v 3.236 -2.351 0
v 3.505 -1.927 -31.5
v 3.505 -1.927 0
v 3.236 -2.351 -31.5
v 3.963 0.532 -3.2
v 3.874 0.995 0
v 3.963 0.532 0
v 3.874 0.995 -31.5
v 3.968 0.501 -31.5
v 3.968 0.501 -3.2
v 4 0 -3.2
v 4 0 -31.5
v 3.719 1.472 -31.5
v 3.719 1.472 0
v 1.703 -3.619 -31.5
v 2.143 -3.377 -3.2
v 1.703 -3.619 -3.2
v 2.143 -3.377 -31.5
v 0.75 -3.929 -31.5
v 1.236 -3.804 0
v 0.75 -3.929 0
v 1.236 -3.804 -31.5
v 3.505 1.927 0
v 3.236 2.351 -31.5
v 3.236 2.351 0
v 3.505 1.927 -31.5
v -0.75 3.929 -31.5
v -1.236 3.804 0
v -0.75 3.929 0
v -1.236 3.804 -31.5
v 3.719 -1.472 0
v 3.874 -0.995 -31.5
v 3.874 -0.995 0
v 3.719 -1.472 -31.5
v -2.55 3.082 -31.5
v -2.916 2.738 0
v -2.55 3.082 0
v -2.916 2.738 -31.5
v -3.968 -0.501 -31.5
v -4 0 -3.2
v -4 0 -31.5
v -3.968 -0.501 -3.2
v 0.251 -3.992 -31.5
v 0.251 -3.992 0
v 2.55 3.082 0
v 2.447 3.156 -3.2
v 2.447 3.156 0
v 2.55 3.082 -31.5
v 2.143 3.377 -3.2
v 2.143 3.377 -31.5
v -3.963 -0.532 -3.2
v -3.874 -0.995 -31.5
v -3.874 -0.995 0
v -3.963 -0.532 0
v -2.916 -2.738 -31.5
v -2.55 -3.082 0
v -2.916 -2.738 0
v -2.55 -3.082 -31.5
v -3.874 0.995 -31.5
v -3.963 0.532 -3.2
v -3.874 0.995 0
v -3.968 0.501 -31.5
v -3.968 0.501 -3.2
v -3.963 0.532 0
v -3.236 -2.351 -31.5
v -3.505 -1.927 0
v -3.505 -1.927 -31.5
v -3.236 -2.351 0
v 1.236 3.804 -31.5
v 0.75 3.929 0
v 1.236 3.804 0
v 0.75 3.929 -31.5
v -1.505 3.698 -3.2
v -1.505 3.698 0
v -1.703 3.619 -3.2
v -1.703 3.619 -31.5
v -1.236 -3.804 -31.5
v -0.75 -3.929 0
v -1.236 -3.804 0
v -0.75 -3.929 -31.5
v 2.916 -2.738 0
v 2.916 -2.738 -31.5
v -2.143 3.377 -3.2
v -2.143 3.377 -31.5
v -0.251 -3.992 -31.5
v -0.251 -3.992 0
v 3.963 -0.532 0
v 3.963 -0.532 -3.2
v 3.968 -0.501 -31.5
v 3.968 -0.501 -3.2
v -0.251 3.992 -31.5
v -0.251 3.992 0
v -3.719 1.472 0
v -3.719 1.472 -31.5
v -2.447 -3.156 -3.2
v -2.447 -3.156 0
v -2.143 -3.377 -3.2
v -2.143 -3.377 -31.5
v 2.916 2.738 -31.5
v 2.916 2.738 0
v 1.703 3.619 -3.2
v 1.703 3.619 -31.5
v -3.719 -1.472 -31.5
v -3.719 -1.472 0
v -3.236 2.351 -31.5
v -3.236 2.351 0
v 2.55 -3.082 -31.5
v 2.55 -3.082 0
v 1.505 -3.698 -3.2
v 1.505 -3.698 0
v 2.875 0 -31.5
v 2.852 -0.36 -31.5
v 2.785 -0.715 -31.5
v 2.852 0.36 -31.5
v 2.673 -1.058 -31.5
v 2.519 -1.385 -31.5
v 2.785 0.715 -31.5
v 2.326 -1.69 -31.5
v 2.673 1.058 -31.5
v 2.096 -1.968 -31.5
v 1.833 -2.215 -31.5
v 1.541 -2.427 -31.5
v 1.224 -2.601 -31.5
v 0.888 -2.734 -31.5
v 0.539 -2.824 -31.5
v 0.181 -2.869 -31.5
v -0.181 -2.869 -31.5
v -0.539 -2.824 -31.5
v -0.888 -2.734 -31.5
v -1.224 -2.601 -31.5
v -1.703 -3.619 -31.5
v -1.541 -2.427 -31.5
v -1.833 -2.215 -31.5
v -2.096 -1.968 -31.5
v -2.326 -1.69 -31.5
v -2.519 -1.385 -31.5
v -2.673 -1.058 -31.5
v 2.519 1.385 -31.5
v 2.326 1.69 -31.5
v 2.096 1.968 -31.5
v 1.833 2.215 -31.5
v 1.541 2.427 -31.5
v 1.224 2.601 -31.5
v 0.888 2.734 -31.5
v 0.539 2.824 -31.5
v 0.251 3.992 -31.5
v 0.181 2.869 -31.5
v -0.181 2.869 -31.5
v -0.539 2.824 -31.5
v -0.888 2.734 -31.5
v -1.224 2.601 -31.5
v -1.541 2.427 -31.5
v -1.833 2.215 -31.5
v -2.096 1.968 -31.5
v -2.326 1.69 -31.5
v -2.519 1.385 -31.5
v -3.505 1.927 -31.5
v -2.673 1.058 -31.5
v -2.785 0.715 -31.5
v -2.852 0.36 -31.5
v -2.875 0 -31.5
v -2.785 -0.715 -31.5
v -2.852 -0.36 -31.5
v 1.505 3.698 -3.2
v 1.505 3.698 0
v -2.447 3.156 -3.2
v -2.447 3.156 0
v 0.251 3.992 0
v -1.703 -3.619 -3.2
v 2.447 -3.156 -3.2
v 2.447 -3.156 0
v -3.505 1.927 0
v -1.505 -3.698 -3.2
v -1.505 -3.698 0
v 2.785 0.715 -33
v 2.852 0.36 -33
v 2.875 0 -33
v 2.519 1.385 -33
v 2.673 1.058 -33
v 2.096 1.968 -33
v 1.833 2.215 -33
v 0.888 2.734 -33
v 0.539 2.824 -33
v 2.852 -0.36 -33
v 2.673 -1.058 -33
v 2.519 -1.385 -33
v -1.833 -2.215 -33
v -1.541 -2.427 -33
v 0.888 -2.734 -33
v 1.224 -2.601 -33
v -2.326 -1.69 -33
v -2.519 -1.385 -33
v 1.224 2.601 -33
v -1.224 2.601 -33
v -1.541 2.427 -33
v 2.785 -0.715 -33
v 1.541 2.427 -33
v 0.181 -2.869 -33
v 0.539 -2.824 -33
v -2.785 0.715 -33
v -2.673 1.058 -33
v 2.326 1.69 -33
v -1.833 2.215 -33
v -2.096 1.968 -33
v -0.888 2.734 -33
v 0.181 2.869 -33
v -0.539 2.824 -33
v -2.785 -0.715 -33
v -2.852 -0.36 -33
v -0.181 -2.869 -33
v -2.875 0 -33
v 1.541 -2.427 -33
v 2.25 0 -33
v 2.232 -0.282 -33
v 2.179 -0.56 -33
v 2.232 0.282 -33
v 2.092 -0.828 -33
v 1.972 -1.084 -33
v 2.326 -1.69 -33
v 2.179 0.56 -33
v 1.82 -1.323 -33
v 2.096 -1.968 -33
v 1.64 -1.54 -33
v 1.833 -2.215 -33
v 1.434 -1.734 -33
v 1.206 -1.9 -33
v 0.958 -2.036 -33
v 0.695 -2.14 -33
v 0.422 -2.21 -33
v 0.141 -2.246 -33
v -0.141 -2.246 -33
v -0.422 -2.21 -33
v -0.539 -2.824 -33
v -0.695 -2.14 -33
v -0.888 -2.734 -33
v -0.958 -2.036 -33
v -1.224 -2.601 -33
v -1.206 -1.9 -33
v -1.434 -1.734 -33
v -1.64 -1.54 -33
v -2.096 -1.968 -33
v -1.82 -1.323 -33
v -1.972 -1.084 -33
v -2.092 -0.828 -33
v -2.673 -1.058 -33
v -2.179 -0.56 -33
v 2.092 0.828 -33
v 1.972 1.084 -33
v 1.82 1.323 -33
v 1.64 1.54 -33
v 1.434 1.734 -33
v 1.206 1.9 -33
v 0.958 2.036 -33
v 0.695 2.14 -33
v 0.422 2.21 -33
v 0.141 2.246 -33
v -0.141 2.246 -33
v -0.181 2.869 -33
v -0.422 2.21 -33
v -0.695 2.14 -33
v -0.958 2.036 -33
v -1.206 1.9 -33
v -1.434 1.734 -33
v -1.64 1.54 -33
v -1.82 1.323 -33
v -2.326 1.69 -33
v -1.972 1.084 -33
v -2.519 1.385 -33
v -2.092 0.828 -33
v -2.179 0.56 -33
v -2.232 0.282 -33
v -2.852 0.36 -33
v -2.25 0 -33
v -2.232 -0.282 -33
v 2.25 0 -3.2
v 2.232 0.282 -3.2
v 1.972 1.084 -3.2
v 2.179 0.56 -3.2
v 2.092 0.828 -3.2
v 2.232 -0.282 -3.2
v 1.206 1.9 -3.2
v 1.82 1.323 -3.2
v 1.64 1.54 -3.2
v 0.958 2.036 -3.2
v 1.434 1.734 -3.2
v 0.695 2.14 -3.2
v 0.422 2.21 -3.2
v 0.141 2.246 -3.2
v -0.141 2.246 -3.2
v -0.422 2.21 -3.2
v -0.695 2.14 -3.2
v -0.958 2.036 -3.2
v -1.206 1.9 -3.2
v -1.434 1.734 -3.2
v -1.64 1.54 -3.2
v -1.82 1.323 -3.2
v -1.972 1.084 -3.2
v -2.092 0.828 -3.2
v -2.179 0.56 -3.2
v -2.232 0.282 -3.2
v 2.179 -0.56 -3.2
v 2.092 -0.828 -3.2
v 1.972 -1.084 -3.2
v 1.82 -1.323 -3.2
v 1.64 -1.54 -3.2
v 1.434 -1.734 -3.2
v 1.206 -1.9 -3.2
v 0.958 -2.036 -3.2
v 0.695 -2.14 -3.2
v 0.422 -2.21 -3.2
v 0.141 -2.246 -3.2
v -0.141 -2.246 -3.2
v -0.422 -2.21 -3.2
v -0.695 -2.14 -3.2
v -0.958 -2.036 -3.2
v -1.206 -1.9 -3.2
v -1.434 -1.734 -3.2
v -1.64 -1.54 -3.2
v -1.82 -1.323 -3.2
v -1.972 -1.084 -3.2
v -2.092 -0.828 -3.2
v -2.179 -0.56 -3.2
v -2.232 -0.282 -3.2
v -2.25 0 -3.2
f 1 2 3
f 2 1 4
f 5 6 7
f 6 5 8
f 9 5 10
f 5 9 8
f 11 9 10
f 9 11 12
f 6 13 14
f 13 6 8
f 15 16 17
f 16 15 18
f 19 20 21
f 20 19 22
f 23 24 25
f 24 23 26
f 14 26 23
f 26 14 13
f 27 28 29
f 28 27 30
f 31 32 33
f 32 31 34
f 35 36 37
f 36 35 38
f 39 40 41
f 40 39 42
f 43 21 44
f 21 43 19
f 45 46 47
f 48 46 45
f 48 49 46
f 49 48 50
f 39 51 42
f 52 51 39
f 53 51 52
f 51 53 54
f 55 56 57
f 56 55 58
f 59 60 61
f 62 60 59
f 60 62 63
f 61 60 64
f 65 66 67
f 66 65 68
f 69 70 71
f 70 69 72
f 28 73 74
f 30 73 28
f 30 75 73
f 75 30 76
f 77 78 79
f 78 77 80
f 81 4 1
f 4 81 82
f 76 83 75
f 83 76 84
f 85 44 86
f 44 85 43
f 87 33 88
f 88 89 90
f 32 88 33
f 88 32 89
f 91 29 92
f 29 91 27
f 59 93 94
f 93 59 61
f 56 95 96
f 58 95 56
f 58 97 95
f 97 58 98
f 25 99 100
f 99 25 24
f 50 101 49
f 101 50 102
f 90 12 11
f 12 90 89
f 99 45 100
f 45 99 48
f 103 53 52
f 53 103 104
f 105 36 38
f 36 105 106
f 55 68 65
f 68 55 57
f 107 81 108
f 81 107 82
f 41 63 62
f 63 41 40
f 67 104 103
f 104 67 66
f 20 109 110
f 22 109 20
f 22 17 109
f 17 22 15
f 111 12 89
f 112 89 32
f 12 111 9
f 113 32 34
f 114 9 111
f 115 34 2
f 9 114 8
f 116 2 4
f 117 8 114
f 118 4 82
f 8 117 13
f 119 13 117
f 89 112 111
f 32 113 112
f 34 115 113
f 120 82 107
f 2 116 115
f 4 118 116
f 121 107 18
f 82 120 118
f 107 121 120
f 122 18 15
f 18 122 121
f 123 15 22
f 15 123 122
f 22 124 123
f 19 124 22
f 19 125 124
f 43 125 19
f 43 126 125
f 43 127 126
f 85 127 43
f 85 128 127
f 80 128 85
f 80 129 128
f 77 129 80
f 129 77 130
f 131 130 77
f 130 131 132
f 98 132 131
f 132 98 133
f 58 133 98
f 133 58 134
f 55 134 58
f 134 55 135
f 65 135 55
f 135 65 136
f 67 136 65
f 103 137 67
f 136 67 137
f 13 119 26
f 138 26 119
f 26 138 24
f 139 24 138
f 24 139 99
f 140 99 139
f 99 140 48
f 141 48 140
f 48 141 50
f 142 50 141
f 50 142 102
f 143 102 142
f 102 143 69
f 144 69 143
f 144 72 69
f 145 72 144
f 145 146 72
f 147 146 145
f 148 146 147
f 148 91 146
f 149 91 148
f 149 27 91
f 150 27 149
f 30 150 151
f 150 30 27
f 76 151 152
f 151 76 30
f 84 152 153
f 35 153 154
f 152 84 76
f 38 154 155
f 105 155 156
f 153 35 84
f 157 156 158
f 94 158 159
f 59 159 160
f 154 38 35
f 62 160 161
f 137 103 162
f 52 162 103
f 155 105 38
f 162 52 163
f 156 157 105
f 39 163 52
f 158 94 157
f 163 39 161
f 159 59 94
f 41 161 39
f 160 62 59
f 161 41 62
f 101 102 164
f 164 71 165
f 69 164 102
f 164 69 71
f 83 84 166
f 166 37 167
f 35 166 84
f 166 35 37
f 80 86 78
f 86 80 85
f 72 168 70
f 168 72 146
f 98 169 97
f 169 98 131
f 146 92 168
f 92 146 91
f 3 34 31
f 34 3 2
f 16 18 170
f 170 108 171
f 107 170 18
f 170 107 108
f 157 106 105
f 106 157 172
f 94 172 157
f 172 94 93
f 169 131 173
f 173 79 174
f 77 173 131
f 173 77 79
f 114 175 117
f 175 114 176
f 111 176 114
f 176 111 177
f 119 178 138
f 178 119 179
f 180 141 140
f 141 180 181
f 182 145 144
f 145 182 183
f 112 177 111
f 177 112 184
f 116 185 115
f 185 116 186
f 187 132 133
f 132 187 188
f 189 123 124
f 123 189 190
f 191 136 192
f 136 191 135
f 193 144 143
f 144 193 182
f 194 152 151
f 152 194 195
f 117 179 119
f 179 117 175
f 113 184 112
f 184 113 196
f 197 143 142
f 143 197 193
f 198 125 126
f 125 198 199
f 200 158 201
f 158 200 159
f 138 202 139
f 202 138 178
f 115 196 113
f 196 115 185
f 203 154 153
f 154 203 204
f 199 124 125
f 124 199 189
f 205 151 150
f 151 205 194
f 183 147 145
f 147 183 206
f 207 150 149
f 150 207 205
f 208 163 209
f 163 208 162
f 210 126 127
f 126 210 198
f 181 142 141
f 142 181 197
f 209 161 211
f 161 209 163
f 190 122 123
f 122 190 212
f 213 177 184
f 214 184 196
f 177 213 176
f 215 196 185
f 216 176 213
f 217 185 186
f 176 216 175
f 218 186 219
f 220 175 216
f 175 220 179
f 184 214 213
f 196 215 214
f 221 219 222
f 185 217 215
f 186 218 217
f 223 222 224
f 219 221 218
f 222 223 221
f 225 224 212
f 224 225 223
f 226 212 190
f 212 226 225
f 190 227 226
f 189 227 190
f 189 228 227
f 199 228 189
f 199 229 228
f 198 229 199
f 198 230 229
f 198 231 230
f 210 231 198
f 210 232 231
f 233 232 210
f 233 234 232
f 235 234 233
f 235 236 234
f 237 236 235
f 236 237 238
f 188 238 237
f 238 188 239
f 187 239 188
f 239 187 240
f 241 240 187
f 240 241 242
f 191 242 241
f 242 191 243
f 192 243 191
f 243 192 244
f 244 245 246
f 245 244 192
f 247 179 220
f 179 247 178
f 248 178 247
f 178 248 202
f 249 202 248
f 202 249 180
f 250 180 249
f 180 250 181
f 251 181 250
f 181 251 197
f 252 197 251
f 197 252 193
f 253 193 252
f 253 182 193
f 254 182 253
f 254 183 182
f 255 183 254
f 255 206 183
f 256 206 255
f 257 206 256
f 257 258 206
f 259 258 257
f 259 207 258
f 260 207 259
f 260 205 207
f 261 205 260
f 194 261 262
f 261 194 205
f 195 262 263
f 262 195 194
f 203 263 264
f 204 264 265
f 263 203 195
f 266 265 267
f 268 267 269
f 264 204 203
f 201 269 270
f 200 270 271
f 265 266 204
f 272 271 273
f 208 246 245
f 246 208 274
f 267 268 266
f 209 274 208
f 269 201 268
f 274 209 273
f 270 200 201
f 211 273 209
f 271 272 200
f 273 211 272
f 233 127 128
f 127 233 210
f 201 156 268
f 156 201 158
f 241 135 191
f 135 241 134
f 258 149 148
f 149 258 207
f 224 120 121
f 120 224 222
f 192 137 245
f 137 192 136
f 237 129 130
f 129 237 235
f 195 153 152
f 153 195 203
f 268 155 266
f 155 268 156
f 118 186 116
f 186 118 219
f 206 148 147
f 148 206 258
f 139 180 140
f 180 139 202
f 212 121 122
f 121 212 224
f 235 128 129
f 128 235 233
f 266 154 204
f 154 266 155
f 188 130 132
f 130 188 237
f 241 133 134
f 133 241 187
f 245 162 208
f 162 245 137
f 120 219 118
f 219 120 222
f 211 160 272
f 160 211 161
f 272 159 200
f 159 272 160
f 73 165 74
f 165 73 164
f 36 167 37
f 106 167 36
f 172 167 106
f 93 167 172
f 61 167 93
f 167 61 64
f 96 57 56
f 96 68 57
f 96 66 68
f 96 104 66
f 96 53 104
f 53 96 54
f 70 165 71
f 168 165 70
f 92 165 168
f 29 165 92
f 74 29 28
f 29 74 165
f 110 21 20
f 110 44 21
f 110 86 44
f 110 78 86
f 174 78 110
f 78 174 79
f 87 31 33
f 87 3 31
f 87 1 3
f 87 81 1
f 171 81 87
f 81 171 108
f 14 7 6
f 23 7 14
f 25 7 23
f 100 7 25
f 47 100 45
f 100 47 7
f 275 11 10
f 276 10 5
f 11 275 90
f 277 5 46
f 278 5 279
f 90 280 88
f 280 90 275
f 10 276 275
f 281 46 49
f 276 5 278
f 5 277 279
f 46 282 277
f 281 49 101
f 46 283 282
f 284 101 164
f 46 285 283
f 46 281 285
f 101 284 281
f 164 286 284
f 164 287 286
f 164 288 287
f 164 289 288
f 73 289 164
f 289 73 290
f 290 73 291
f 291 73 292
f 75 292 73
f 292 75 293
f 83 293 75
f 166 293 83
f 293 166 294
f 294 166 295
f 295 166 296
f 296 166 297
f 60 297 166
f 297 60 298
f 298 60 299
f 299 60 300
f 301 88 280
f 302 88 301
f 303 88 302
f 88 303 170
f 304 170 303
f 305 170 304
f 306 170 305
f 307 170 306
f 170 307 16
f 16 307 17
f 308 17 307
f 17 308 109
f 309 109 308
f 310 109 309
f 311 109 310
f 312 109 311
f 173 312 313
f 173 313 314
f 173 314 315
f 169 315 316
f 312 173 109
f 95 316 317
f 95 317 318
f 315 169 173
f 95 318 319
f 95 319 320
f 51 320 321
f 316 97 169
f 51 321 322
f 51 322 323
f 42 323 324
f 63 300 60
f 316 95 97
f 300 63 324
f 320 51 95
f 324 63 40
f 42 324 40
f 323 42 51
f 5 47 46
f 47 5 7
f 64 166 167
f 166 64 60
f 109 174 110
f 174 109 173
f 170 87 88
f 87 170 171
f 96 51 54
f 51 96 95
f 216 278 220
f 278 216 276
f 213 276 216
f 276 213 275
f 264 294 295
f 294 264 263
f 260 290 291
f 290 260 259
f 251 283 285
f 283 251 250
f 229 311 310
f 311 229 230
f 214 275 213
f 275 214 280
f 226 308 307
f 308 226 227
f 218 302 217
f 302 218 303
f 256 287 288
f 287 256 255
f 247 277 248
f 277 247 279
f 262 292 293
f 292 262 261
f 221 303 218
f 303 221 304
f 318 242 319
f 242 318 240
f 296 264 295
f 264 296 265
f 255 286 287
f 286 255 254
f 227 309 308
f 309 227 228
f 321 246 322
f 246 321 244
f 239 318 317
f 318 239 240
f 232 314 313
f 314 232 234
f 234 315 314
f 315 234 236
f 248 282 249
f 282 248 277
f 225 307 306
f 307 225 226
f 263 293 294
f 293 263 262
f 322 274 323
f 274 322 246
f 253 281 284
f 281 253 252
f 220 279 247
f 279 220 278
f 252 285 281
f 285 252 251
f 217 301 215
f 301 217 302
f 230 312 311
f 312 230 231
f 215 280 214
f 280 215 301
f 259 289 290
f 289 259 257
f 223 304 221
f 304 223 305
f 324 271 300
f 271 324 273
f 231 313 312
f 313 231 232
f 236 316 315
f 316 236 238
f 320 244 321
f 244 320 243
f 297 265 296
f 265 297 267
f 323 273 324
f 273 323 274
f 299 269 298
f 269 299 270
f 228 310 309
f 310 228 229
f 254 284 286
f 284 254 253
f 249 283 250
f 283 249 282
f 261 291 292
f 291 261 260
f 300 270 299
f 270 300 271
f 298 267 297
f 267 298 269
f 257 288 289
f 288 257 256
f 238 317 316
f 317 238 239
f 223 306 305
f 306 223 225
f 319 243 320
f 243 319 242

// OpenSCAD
$fn = 50;

difference() {
	union() {
		translate(v = [0, 0, -31.5]) {
			cylinder(h = 34.5, r = 4.0);
		}
		#translate(v = [0, 0, -33.0]) {
			cylinder(h = 33, r = 2.875);
		}
	}
	union() {
		translate(v = [0, 0, 0]) {
			rotate(a = [0, 0, 0]) {
				difference() {
					union() {
						translate(v = [0, 0, -3.2]) {
							linear_extrude(height = 3.2) {
								polygon(points = [[4.2698, 0.0], [2.1349000000000005, 3.697755269078796], [-2.134899999999999, 3.6977552690787965], [-4.2698, 5.228996902999369e-16], [-2.134900000000002, -3.6977552690787956], [2.1348999999999974, -3.697755269078798]]);
							}
						}
					}
					union();
				}
			}
		}
		#cylinder(h = 3, r = 5.0);
		#translate(v = [0, 0, -100.0]) {
			cylinder(h = 200, r = 2.25);
		}
	}
}
